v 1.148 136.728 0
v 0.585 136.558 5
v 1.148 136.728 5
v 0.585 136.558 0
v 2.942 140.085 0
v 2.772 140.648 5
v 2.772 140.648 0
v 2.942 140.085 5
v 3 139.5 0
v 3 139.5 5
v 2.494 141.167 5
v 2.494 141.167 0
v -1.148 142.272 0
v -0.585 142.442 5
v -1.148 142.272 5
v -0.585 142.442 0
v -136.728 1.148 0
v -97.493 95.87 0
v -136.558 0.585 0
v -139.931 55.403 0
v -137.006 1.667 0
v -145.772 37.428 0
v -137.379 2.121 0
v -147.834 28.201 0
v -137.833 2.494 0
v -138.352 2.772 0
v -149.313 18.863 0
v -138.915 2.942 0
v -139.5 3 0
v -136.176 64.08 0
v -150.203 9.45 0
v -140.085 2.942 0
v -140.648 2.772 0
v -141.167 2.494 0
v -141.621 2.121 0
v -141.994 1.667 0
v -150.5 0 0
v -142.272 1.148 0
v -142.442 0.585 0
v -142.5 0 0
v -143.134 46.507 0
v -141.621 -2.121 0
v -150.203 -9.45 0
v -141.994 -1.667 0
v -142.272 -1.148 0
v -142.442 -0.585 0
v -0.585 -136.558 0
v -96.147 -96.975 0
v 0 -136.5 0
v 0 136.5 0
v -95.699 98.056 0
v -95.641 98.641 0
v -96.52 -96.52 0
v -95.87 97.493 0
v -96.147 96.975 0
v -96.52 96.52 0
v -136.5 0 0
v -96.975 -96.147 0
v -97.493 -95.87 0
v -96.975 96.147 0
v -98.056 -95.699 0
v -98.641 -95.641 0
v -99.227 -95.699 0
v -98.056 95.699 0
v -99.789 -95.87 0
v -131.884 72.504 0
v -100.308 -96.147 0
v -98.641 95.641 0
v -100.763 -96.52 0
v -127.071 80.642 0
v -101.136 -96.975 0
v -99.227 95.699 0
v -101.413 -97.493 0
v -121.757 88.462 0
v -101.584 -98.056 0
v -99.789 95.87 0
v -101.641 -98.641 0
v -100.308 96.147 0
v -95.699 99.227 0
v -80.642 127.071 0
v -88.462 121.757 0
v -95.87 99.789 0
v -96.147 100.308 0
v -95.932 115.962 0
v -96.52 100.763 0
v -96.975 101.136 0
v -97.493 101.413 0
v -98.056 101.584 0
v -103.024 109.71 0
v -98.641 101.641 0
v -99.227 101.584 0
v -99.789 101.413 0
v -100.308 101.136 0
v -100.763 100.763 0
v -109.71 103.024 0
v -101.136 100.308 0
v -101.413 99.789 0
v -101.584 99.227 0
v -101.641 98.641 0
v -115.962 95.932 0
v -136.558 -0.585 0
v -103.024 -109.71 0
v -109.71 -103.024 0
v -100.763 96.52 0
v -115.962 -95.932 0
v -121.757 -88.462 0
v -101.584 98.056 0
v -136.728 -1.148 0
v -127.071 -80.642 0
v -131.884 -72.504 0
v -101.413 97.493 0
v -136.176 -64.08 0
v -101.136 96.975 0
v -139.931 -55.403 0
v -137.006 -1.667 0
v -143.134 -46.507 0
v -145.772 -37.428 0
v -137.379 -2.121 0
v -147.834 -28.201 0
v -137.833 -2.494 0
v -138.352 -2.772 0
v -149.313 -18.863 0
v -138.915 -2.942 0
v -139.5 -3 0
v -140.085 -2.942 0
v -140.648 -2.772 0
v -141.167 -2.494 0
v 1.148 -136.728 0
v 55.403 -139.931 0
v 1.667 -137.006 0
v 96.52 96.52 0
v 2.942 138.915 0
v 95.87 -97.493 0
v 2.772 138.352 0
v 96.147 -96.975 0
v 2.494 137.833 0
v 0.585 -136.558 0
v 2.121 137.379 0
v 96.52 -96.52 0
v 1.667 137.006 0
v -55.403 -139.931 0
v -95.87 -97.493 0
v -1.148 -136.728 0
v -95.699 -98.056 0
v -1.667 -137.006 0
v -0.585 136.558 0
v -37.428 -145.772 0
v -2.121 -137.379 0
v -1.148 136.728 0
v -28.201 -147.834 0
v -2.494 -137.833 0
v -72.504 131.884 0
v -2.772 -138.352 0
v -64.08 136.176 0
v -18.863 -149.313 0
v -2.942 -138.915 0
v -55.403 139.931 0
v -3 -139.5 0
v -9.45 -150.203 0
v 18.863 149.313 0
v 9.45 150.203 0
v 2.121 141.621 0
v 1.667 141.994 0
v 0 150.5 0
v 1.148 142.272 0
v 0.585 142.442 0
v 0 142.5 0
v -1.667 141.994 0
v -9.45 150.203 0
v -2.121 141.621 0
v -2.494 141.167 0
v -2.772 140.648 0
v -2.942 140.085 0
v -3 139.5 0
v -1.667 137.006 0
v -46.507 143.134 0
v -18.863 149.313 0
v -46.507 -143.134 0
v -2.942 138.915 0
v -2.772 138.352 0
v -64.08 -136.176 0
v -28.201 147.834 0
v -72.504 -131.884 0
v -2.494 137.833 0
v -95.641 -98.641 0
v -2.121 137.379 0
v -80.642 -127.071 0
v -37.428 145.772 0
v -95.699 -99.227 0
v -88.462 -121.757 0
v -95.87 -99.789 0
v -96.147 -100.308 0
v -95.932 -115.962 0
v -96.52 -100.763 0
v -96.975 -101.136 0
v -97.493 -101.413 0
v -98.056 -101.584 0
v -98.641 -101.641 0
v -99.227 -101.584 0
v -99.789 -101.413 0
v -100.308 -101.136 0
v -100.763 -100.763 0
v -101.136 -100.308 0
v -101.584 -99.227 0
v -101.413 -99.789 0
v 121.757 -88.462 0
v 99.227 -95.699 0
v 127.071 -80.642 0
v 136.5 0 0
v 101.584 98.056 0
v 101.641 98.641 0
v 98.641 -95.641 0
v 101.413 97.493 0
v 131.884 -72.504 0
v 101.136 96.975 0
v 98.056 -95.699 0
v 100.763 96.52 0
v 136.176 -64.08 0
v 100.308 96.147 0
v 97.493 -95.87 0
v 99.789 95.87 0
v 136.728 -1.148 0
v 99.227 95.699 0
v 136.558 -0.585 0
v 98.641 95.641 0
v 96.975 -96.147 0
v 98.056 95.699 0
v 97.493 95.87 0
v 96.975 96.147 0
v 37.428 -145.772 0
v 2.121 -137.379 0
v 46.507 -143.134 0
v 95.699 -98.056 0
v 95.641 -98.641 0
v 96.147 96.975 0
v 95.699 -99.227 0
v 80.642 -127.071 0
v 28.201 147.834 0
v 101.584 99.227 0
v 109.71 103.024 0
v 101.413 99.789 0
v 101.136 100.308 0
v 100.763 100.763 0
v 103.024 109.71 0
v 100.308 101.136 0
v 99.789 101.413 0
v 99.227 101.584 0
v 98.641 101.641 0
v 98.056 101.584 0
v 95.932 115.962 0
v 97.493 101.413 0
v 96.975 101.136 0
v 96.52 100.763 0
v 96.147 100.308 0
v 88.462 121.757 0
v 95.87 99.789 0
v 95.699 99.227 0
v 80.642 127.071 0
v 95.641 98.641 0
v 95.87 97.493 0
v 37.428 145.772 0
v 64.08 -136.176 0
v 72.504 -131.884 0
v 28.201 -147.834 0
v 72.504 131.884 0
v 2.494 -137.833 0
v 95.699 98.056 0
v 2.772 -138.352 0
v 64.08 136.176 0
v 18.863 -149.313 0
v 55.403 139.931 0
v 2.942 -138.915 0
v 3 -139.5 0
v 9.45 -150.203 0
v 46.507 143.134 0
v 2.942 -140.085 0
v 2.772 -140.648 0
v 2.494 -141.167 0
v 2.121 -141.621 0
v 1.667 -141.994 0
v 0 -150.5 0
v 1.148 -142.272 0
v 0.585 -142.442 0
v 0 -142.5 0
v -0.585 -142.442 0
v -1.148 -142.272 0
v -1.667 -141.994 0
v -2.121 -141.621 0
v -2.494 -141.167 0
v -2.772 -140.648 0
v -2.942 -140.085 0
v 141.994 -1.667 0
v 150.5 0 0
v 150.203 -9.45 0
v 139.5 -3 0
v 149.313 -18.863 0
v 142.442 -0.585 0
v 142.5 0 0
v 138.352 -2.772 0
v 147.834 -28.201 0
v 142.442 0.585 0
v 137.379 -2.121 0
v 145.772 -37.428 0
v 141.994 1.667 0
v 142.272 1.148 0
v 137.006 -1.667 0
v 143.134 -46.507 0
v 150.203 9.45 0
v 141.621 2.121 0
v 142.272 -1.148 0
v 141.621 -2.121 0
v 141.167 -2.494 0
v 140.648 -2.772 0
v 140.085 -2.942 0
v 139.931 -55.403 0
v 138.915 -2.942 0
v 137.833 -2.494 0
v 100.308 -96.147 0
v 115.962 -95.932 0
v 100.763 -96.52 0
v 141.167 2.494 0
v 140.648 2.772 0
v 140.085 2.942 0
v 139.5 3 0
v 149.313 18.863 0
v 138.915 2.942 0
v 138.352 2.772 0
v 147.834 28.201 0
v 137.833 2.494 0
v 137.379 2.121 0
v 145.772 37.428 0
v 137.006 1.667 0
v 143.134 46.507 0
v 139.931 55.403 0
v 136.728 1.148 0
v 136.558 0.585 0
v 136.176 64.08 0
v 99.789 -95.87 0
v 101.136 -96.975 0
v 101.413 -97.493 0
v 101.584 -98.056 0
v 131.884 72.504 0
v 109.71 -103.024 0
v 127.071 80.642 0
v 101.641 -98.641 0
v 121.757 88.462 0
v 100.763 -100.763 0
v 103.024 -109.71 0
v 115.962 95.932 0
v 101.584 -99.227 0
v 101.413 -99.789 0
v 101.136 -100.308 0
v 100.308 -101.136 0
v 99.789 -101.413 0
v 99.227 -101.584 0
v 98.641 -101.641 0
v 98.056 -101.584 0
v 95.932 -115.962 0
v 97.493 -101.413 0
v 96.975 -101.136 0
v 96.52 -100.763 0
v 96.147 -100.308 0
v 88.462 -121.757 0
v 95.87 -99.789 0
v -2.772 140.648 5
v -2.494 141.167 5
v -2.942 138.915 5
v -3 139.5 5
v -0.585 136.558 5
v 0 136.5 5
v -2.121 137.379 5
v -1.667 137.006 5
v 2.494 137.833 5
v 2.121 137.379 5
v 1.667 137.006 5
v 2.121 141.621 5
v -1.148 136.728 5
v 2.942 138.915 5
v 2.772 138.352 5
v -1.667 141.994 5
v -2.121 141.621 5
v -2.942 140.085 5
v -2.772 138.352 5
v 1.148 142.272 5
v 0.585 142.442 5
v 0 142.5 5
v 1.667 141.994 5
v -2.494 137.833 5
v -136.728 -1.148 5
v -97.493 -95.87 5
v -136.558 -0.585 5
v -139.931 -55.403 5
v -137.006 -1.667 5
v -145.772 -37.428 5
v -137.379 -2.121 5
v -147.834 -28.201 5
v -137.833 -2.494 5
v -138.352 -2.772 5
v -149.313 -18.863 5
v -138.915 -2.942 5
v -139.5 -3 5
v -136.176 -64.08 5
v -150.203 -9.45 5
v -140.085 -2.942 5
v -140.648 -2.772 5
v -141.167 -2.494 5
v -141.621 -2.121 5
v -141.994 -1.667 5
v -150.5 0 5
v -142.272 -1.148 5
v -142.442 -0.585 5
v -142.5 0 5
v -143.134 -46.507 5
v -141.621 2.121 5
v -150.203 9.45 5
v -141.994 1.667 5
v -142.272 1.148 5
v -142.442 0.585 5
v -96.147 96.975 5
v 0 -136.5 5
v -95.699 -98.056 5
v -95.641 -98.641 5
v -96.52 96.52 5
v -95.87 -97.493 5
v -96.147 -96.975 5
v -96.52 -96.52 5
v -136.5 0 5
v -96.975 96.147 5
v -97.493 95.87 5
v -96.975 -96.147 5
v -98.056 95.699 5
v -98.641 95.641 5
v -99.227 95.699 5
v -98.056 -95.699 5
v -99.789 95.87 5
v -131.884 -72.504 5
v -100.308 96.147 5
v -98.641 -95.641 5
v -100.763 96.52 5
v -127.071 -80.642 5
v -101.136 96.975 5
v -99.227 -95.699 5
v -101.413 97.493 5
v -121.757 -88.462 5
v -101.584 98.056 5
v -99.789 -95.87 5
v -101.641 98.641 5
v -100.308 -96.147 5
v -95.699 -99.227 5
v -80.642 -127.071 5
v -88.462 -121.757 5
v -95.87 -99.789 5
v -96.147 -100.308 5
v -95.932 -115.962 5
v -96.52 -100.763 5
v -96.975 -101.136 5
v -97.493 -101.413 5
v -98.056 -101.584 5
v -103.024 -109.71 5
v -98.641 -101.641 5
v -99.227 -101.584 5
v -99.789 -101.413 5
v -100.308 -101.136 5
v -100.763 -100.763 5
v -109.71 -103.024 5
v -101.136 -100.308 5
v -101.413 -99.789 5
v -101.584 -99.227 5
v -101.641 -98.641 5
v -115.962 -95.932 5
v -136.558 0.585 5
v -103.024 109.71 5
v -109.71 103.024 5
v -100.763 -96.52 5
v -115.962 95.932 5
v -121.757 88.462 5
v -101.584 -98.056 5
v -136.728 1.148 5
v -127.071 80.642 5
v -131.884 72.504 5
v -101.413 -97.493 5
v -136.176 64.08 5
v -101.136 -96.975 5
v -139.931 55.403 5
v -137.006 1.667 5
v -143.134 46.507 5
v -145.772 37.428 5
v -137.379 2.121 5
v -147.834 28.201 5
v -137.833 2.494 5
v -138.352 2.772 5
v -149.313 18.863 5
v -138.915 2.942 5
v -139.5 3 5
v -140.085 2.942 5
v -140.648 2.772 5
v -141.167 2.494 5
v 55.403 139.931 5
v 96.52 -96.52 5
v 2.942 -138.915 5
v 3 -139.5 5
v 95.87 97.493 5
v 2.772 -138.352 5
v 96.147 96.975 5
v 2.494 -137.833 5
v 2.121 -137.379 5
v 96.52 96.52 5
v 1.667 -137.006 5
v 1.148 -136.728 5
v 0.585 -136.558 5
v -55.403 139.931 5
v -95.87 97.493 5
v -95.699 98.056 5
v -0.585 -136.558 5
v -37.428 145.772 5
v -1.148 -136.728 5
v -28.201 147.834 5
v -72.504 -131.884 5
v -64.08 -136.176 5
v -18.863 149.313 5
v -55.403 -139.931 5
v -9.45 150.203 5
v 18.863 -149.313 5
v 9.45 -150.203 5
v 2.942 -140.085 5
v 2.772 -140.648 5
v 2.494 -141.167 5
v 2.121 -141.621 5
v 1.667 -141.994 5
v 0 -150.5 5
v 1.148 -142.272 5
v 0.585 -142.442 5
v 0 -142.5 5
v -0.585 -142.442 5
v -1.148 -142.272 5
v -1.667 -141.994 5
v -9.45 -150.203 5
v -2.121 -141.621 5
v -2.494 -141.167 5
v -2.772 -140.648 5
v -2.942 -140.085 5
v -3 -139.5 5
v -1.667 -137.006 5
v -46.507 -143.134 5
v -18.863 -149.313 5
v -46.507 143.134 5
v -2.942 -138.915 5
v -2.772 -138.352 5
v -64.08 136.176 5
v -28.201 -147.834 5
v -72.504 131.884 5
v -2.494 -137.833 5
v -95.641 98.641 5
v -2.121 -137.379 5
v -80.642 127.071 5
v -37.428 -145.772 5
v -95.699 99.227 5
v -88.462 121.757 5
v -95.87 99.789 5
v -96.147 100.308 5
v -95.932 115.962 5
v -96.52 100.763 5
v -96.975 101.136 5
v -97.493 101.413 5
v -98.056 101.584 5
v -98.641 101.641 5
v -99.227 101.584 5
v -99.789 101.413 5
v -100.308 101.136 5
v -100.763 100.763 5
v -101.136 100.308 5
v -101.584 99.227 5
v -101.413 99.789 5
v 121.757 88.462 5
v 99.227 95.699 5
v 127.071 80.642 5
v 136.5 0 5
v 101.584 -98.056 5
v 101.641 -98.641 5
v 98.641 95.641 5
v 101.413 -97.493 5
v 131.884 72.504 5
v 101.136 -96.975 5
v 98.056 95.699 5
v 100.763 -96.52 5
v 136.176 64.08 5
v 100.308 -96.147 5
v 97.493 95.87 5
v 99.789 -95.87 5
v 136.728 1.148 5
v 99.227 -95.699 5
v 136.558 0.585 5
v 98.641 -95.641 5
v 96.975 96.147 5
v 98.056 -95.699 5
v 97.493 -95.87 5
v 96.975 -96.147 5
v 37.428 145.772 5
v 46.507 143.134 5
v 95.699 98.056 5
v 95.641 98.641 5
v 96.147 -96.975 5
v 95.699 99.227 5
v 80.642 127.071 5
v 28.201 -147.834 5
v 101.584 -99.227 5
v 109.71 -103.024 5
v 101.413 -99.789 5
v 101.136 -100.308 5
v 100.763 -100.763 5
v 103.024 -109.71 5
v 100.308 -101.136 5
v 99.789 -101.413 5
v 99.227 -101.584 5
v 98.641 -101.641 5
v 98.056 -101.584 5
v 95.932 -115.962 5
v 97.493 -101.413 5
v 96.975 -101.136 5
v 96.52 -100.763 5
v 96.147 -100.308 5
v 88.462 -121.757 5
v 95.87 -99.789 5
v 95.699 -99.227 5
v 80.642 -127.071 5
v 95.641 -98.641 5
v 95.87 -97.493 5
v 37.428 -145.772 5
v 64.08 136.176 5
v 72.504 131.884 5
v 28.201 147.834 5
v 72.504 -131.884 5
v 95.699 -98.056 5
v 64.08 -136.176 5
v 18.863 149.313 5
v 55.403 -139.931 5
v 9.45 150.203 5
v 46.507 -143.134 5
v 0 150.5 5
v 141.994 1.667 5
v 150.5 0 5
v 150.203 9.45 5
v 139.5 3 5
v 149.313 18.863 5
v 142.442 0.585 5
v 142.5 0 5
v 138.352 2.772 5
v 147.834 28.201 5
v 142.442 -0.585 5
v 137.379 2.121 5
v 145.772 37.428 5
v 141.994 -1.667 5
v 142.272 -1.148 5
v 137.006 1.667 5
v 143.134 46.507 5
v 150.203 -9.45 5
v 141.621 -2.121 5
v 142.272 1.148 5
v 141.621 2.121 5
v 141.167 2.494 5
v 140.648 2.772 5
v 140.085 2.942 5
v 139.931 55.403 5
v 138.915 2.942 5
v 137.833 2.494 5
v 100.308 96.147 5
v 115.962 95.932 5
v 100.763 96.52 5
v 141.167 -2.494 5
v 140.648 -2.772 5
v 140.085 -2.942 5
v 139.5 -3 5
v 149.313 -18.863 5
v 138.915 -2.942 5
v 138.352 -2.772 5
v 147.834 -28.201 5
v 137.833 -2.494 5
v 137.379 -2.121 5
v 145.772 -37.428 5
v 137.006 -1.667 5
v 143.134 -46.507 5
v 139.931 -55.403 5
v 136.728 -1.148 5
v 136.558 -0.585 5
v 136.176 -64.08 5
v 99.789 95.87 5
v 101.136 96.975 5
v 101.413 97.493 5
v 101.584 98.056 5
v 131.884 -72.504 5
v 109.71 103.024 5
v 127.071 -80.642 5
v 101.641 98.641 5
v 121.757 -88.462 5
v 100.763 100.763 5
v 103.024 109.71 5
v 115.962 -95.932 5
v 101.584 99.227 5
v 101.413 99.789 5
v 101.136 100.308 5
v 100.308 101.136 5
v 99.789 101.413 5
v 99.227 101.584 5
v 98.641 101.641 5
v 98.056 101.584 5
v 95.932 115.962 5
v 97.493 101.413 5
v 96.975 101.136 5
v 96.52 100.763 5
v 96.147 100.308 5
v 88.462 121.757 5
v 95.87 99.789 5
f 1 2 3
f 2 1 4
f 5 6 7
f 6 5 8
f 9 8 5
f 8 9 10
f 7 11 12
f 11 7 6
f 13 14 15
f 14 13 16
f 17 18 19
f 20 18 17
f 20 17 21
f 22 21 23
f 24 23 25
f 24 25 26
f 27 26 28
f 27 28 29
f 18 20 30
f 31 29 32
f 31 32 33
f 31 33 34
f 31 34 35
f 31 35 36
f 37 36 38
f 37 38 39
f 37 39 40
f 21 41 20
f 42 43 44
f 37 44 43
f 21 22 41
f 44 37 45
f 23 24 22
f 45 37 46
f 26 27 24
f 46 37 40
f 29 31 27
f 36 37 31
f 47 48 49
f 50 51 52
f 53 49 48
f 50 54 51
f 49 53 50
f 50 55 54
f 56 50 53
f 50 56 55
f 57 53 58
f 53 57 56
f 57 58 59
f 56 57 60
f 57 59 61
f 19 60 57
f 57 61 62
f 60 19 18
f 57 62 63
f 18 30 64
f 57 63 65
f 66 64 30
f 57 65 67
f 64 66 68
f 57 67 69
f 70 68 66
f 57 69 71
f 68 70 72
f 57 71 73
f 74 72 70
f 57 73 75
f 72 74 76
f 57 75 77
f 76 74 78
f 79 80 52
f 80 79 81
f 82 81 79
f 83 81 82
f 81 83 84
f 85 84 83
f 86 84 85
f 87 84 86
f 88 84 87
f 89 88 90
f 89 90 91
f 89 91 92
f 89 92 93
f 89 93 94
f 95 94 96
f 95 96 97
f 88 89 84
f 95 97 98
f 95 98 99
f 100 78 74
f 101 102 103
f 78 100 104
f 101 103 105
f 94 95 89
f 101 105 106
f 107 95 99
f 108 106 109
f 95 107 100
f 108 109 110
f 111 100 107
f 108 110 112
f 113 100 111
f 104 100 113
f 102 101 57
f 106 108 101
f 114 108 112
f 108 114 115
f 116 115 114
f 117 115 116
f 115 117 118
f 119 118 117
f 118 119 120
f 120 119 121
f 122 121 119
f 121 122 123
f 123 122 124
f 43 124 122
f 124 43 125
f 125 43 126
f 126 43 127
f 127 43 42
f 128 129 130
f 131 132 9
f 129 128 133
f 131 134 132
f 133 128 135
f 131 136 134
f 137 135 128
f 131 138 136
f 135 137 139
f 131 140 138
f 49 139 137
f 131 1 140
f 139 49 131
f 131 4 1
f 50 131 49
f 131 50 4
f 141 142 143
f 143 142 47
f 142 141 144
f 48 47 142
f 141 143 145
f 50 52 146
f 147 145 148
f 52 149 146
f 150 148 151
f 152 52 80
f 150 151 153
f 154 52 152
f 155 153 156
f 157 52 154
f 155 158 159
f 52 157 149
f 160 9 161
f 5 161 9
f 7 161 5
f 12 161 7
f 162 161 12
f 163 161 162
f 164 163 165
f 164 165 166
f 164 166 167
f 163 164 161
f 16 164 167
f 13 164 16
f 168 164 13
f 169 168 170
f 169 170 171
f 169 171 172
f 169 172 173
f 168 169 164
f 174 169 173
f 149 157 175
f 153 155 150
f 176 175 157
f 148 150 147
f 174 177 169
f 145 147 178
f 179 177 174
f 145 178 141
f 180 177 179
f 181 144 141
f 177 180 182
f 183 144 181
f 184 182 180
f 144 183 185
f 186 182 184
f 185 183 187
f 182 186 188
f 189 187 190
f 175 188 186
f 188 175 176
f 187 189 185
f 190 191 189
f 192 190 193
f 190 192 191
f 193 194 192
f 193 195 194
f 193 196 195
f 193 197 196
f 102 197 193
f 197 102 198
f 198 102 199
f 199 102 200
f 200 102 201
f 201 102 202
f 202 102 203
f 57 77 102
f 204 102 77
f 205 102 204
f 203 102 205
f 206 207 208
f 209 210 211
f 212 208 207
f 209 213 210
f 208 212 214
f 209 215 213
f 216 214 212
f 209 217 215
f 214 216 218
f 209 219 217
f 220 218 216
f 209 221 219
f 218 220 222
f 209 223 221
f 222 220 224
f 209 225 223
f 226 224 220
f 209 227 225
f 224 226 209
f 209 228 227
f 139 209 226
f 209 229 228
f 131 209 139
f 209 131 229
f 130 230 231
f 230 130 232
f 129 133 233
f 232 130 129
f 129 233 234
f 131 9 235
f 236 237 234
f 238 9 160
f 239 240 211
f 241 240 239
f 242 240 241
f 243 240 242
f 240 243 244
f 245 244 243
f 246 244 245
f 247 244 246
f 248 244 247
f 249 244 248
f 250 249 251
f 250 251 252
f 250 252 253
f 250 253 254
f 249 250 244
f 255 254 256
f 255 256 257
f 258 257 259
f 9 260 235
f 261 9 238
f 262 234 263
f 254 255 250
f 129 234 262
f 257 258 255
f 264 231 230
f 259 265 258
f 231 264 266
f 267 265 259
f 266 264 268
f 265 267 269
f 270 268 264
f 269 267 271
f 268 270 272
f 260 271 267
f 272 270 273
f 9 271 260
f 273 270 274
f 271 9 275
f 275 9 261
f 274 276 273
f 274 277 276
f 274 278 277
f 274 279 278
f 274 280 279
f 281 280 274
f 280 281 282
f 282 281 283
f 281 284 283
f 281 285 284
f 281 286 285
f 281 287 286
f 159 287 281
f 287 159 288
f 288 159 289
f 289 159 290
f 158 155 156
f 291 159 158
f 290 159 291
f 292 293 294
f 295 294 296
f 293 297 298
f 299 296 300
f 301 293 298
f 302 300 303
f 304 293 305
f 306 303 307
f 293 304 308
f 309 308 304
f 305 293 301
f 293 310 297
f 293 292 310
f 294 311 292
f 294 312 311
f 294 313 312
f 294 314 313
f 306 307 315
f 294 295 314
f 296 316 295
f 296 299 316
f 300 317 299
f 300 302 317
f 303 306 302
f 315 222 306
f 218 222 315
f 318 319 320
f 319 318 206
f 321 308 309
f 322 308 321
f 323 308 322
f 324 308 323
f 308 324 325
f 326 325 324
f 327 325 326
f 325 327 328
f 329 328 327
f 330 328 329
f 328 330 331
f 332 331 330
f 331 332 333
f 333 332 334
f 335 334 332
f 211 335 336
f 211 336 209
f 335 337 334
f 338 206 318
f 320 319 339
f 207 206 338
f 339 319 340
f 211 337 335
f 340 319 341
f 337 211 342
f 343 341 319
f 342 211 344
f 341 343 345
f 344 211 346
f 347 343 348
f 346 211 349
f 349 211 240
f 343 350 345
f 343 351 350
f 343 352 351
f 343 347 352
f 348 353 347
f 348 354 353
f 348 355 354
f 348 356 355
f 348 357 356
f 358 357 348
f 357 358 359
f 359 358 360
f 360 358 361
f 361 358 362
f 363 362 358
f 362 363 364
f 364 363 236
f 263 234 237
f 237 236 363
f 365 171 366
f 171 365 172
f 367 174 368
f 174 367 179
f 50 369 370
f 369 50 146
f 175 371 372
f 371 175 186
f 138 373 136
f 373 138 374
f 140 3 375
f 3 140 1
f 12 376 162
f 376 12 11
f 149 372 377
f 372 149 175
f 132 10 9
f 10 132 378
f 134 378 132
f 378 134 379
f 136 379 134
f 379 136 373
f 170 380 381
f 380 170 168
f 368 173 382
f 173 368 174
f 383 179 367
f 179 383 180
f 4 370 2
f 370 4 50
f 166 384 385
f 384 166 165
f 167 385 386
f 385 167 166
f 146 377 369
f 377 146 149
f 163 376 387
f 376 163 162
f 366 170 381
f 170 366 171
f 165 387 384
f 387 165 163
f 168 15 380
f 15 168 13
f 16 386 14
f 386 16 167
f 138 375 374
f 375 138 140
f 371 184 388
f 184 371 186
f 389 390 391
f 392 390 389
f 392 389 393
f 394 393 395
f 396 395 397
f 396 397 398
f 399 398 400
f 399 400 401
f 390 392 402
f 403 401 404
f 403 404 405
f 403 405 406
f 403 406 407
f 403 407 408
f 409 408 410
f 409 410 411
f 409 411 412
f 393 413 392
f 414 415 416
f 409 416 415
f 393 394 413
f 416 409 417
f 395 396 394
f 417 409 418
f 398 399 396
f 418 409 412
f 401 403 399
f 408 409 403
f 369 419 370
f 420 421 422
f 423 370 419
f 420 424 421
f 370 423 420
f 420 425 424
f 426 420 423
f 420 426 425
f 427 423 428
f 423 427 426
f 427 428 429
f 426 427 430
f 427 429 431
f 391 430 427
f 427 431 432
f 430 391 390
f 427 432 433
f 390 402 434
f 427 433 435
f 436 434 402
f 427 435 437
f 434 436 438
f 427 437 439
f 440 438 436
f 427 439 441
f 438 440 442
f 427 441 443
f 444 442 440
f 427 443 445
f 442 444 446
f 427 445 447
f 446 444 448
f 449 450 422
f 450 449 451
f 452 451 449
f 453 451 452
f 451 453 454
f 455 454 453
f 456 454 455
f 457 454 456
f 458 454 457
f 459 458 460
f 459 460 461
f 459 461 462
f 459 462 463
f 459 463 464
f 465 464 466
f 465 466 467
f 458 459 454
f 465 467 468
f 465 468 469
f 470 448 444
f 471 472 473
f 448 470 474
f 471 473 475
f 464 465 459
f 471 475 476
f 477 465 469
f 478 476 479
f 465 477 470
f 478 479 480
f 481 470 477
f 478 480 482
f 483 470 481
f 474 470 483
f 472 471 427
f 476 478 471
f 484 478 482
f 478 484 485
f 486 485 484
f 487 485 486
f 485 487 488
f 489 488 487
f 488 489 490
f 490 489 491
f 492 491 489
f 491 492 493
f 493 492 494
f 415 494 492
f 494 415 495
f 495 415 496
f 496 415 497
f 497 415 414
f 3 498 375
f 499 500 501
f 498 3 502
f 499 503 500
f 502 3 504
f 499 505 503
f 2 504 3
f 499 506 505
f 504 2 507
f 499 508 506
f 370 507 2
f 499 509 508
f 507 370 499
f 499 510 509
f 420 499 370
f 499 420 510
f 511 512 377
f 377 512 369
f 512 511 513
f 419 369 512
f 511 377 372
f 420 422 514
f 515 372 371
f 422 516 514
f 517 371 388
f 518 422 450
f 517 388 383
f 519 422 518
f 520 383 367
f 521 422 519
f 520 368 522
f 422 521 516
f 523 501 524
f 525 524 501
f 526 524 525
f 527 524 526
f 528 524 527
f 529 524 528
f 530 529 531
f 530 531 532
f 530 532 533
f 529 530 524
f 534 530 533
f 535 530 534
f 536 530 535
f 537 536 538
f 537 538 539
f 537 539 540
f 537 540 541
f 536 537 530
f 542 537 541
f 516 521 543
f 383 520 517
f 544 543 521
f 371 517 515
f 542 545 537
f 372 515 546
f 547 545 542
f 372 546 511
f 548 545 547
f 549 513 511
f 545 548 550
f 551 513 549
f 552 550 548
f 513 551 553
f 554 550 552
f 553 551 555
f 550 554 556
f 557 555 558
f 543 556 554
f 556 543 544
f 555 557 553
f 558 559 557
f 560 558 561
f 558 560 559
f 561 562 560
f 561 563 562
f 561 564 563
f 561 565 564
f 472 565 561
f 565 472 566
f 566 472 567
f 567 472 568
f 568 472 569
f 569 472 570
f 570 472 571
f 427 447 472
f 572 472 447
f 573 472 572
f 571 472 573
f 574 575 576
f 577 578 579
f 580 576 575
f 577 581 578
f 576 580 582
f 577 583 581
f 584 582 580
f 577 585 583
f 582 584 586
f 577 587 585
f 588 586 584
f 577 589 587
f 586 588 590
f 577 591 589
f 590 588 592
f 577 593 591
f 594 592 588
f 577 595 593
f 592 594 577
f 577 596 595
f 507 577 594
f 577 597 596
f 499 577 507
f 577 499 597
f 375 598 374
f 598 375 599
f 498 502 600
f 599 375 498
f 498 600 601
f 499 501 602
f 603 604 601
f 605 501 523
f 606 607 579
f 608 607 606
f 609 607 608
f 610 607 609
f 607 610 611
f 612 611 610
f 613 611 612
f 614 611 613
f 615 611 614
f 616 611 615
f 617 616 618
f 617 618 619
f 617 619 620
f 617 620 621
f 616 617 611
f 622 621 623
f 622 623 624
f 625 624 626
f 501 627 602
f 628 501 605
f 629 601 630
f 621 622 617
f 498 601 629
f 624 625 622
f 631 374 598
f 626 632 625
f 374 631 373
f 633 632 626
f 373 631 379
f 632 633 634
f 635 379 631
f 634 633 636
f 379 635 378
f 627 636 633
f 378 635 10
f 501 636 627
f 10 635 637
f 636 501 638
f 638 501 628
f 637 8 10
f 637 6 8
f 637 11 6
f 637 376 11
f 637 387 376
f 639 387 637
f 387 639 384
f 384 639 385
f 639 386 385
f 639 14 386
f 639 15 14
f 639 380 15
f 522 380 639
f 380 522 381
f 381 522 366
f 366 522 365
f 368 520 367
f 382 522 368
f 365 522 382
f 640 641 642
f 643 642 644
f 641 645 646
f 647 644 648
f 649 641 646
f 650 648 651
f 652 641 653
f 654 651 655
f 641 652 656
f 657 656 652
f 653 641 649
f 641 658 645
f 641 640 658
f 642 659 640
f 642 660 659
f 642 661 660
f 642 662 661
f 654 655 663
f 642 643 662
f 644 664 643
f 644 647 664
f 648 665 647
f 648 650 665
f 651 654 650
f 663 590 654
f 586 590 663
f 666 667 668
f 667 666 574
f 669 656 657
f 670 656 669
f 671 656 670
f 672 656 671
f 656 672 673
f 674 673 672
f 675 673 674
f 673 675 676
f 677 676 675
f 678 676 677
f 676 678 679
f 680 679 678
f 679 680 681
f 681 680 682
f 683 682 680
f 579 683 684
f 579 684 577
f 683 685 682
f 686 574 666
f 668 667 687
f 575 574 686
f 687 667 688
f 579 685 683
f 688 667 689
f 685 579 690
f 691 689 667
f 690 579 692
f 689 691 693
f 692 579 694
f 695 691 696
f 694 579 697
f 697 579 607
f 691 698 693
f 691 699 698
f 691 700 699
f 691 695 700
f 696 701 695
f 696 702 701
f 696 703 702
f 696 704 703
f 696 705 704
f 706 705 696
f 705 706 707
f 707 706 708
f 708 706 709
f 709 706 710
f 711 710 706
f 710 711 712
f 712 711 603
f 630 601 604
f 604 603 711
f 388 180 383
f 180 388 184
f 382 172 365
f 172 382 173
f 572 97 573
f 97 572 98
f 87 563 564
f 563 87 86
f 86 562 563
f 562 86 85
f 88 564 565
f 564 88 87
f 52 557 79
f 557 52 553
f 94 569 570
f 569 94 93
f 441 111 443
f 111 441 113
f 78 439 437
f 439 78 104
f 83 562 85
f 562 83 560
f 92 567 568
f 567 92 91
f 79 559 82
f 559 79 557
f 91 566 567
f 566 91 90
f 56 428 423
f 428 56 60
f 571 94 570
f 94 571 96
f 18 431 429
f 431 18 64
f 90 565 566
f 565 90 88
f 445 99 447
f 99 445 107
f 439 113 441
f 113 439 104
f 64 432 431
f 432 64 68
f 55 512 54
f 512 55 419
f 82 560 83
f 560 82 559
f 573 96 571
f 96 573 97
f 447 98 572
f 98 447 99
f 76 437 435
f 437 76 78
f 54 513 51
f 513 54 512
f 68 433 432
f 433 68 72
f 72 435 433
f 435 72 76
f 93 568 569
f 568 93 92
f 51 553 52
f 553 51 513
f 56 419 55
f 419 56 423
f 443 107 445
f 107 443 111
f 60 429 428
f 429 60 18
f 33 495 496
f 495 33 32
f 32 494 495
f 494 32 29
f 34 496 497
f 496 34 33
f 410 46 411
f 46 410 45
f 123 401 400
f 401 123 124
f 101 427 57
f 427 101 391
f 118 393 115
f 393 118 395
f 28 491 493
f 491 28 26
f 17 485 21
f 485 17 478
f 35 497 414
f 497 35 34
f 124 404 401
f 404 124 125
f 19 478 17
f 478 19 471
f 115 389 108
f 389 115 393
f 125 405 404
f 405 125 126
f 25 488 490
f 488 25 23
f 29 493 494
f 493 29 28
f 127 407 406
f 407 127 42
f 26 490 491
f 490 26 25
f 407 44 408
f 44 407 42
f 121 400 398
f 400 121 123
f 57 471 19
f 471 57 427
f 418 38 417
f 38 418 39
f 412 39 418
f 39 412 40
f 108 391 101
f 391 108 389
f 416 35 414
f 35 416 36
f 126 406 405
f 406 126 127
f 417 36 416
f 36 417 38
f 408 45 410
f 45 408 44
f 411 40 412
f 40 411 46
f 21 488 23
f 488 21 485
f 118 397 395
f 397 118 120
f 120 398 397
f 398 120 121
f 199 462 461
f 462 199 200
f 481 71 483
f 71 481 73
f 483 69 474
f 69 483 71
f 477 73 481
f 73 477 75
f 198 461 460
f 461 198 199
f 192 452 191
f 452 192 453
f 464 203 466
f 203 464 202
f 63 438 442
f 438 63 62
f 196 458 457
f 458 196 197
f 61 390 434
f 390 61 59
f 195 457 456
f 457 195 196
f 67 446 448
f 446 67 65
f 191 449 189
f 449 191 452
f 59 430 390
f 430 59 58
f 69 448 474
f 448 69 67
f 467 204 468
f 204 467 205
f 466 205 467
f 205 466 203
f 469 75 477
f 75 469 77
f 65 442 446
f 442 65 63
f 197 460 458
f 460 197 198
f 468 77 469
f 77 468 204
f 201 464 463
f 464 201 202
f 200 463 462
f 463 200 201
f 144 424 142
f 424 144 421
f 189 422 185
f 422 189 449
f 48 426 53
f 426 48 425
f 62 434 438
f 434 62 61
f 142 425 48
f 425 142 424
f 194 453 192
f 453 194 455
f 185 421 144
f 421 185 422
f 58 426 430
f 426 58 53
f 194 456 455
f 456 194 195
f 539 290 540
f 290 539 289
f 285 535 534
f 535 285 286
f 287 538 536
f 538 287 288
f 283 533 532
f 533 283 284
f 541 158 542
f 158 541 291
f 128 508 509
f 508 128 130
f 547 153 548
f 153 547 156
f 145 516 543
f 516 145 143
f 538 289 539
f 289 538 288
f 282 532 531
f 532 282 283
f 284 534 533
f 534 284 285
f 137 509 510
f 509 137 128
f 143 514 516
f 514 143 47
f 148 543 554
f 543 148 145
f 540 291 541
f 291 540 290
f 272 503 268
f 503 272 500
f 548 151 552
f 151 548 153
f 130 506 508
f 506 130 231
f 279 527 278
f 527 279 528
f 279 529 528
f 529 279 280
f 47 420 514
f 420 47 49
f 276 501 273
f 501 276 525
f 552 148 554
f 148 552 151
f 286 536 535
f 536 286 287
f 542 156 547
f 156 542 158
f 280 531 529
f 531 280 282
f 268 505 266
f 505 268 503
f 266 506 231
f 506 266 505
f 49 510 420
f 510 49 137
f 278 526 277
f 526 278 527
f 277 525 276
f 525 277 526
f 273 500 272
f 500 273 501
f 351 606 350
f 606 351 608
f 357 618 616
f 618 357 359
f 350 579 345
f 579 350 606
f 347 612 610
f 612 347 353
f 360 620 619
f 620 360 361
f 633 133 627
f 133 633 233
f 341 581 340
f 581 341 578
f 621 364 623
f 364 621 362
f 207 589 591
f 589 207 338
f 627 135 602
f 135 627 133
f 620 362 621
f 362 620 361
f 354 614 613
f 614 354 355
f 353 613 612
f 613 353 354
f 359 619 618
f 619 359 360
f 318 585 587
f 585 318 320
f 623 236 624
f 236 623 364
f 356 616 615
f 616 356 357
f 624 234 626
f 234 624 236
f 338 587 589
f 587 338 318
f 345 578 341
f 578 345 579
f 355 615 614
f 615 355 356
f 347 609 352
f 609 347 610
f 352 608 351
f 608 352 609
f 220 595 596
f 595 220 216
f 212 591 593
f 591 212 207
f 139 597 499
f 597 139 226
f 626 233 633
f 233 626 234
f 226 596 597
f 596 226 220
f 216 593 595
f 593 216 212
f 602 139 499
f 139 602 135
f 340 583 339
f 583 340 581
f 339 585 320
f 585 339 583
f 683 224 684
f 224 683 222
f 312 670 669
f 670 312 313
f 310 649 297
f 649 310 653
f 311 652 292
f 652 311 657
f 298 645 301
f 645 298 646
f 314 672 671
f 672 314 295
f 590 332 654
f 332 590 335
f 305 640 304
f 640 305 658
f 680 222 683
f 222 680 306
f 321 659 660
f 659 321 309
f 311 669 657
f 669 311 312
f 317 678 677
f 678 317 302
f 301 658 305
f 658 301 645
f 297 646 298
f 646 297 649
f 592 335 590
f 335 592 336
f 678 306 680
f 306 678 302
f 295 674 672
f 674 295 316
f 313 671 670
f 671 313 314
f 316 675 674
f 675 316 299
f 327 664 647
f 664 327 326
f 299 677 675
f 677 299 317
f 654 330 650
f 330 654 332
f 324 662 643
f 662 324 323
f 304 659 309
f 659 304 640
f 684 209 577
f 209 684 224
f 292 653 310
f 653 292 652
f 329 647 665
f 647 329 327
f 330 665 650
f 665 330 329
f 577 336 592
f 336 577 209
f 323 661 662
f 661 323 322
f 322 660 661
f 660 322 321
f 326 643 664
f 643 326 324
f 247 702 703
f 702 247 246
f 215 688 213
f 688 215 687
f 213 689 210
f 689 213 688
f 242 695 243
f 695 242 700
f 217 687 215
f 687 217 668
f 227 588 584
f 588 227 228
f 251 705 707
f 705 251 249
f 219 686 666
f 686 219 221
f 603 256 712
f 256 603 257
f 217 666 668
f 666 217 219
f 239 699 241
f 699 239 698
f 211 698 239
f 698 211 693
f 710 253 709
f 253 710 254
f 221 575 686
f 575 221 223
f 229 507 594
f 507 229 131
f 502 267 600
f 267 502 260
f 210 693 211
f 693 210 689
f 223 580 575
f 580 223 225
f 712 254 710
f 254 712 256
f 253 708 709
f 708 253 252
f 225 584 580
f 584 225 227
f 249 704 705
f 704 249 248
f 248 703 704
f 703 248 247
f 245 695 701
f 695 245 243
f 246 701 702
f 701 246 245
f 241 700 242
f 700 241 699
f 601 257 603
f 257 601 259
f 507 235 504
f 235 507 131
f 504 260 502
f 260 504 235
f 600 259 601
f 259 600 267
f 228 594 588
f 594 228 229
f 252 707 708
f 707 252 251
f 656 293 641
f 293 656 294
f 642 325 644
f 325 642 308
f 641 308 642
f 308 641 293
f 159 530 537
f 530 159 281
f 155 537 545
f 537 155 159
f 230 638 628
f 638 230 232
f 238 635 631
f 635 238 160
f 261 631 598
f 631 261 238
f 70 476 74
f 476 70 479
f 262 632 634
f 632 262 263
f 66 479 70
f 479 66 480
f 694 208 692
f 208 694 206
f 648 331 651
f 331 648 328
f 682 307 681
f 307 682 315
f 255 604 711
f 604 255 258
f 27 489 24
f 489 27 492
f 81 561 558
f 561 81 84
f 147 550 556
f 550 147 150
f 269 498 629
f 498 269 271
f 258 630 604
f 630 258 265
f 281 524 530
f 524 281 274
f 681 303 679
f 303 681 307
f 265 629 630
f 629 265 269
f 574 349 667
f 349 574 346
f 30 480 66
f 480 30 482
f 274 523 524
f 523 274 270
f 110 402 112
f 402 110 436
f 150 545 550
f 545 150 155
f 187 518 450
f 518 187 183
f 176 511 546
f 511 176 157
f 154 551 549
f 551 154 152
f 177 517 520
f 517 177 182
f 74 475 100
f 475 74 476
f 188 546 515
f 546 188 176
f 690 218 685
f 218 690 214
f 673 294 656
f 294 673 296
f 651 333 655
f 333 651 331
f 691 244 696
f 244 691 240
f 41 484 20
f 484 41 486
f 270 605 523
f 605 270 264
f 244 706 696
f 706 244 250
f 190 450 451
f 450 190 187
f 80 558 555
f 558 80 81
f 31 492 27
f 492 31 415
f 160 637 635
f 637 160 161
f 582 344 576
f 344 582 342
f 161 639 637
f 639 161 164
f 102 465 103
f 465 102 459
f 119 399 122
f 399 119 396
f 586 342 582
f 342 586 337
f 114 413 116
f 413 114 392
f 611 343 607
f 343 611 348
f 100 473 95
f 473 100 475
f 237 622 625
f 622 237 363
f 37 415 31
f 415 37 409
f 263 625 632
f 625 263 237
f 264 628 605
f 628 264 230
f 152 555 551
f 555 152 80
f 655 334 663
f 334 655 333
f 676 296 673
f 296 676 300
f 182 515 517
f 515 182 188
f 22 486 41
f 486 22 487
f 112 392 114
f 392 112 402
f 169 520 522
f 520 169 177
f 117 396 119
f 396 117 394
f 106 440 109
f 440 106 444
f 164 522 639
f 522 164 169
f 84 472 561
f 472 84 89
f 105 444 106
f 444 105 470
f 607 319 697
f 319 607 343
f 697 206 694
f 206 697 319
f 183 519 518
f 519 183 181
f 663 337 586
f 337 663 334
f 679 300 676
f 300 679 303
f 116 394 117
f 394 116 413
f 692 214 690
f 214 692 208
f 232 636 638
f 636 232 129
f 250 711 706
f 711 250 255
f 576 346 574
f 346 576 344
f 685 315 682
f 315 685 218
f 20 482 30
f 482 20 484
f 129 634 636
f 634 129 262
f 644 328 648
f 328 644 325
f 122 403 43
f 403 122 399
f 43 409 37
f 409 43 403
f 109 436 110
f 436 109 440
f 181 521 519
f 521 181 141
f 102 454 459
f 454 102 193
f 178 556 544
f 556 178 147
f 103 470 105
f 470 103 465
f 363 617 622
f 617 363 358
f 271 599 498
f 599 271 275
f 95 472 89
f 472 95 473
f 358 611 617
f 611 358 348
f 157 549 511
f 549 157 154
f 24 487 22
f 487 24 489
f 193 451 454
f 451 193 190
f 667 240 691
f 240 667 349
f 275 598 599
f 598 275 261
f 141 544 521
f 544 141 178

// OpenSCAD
dia = 301;
dia_skrue = 6;
skrue_rim_dist = 11;
h = 5;
text_h = 1.5;
bugdrit = $preview ? .1 : 0;

echo(str("bugdrit = ", bugdrit));

/*
module circular_text(text_string, radius = 50, inward = true) {
    angle_step = 360 / len(text_string);
    for (i = [0 : len(text_string) - 1]) {
        char = text_string[i];
        angle = i * angle_step;
        rotate([0, 0, angle])
            translate([radius, 0, 0])
                rotate([0, 0, inward ? -90 : 90])
                    text(char, size = 5, valign = "center", halign = "center");
    }
}
*/

module circular_text(text_string, radius = 50, inward = true, arc_degrees = 360) {
    char_count = len(text_string);
    angle_step = arc_degrees / (char_count - 1); // Spread characters evenly across arc
    start_angle = -arc_degrees / 2; // Center the arc

    for (i = [0 : char_count - 1]) {
        char = text_string[i];
        angle = start_angle + i * angle_step;
        rotate([0, 0, angle])
            translate([radius, 0, 0])
                rotate([0, 0, inward ? -90 : 90])
                    text(char, size = 5, valign = "center", halign = "center");
    }
}

module hovedskive() {
    difference() {
        cylinder(h=h, d=dia, $fn = 100);
        for (theta = [ 0 : 45 : 315 ]) {
            echo(str("Rotér ", theta, " grader og lag et høl"));
            rotate([0,0,theta]) {
                translate([0,dia/2-skrue_rim_dist,-bugdrit]) {
                    cylinder(h=h+bugdrit*2, d=dia_skrue, $fn = 32);
                }
            }
        }
    }
}

module logo() {
//    translate([0, 0, h-text_h]) 
    rotate([0,0,90]) {
        linear_extrude(height=h) {
//        circular_text("pinnedyr.no", radius = dia/2-20, inward = true);
            circular_text("pinnedyr.no", radius = dia/2-20, inward = true, arc_degrees = 60);
        }
    }
}

//logo();
hovedskive();
